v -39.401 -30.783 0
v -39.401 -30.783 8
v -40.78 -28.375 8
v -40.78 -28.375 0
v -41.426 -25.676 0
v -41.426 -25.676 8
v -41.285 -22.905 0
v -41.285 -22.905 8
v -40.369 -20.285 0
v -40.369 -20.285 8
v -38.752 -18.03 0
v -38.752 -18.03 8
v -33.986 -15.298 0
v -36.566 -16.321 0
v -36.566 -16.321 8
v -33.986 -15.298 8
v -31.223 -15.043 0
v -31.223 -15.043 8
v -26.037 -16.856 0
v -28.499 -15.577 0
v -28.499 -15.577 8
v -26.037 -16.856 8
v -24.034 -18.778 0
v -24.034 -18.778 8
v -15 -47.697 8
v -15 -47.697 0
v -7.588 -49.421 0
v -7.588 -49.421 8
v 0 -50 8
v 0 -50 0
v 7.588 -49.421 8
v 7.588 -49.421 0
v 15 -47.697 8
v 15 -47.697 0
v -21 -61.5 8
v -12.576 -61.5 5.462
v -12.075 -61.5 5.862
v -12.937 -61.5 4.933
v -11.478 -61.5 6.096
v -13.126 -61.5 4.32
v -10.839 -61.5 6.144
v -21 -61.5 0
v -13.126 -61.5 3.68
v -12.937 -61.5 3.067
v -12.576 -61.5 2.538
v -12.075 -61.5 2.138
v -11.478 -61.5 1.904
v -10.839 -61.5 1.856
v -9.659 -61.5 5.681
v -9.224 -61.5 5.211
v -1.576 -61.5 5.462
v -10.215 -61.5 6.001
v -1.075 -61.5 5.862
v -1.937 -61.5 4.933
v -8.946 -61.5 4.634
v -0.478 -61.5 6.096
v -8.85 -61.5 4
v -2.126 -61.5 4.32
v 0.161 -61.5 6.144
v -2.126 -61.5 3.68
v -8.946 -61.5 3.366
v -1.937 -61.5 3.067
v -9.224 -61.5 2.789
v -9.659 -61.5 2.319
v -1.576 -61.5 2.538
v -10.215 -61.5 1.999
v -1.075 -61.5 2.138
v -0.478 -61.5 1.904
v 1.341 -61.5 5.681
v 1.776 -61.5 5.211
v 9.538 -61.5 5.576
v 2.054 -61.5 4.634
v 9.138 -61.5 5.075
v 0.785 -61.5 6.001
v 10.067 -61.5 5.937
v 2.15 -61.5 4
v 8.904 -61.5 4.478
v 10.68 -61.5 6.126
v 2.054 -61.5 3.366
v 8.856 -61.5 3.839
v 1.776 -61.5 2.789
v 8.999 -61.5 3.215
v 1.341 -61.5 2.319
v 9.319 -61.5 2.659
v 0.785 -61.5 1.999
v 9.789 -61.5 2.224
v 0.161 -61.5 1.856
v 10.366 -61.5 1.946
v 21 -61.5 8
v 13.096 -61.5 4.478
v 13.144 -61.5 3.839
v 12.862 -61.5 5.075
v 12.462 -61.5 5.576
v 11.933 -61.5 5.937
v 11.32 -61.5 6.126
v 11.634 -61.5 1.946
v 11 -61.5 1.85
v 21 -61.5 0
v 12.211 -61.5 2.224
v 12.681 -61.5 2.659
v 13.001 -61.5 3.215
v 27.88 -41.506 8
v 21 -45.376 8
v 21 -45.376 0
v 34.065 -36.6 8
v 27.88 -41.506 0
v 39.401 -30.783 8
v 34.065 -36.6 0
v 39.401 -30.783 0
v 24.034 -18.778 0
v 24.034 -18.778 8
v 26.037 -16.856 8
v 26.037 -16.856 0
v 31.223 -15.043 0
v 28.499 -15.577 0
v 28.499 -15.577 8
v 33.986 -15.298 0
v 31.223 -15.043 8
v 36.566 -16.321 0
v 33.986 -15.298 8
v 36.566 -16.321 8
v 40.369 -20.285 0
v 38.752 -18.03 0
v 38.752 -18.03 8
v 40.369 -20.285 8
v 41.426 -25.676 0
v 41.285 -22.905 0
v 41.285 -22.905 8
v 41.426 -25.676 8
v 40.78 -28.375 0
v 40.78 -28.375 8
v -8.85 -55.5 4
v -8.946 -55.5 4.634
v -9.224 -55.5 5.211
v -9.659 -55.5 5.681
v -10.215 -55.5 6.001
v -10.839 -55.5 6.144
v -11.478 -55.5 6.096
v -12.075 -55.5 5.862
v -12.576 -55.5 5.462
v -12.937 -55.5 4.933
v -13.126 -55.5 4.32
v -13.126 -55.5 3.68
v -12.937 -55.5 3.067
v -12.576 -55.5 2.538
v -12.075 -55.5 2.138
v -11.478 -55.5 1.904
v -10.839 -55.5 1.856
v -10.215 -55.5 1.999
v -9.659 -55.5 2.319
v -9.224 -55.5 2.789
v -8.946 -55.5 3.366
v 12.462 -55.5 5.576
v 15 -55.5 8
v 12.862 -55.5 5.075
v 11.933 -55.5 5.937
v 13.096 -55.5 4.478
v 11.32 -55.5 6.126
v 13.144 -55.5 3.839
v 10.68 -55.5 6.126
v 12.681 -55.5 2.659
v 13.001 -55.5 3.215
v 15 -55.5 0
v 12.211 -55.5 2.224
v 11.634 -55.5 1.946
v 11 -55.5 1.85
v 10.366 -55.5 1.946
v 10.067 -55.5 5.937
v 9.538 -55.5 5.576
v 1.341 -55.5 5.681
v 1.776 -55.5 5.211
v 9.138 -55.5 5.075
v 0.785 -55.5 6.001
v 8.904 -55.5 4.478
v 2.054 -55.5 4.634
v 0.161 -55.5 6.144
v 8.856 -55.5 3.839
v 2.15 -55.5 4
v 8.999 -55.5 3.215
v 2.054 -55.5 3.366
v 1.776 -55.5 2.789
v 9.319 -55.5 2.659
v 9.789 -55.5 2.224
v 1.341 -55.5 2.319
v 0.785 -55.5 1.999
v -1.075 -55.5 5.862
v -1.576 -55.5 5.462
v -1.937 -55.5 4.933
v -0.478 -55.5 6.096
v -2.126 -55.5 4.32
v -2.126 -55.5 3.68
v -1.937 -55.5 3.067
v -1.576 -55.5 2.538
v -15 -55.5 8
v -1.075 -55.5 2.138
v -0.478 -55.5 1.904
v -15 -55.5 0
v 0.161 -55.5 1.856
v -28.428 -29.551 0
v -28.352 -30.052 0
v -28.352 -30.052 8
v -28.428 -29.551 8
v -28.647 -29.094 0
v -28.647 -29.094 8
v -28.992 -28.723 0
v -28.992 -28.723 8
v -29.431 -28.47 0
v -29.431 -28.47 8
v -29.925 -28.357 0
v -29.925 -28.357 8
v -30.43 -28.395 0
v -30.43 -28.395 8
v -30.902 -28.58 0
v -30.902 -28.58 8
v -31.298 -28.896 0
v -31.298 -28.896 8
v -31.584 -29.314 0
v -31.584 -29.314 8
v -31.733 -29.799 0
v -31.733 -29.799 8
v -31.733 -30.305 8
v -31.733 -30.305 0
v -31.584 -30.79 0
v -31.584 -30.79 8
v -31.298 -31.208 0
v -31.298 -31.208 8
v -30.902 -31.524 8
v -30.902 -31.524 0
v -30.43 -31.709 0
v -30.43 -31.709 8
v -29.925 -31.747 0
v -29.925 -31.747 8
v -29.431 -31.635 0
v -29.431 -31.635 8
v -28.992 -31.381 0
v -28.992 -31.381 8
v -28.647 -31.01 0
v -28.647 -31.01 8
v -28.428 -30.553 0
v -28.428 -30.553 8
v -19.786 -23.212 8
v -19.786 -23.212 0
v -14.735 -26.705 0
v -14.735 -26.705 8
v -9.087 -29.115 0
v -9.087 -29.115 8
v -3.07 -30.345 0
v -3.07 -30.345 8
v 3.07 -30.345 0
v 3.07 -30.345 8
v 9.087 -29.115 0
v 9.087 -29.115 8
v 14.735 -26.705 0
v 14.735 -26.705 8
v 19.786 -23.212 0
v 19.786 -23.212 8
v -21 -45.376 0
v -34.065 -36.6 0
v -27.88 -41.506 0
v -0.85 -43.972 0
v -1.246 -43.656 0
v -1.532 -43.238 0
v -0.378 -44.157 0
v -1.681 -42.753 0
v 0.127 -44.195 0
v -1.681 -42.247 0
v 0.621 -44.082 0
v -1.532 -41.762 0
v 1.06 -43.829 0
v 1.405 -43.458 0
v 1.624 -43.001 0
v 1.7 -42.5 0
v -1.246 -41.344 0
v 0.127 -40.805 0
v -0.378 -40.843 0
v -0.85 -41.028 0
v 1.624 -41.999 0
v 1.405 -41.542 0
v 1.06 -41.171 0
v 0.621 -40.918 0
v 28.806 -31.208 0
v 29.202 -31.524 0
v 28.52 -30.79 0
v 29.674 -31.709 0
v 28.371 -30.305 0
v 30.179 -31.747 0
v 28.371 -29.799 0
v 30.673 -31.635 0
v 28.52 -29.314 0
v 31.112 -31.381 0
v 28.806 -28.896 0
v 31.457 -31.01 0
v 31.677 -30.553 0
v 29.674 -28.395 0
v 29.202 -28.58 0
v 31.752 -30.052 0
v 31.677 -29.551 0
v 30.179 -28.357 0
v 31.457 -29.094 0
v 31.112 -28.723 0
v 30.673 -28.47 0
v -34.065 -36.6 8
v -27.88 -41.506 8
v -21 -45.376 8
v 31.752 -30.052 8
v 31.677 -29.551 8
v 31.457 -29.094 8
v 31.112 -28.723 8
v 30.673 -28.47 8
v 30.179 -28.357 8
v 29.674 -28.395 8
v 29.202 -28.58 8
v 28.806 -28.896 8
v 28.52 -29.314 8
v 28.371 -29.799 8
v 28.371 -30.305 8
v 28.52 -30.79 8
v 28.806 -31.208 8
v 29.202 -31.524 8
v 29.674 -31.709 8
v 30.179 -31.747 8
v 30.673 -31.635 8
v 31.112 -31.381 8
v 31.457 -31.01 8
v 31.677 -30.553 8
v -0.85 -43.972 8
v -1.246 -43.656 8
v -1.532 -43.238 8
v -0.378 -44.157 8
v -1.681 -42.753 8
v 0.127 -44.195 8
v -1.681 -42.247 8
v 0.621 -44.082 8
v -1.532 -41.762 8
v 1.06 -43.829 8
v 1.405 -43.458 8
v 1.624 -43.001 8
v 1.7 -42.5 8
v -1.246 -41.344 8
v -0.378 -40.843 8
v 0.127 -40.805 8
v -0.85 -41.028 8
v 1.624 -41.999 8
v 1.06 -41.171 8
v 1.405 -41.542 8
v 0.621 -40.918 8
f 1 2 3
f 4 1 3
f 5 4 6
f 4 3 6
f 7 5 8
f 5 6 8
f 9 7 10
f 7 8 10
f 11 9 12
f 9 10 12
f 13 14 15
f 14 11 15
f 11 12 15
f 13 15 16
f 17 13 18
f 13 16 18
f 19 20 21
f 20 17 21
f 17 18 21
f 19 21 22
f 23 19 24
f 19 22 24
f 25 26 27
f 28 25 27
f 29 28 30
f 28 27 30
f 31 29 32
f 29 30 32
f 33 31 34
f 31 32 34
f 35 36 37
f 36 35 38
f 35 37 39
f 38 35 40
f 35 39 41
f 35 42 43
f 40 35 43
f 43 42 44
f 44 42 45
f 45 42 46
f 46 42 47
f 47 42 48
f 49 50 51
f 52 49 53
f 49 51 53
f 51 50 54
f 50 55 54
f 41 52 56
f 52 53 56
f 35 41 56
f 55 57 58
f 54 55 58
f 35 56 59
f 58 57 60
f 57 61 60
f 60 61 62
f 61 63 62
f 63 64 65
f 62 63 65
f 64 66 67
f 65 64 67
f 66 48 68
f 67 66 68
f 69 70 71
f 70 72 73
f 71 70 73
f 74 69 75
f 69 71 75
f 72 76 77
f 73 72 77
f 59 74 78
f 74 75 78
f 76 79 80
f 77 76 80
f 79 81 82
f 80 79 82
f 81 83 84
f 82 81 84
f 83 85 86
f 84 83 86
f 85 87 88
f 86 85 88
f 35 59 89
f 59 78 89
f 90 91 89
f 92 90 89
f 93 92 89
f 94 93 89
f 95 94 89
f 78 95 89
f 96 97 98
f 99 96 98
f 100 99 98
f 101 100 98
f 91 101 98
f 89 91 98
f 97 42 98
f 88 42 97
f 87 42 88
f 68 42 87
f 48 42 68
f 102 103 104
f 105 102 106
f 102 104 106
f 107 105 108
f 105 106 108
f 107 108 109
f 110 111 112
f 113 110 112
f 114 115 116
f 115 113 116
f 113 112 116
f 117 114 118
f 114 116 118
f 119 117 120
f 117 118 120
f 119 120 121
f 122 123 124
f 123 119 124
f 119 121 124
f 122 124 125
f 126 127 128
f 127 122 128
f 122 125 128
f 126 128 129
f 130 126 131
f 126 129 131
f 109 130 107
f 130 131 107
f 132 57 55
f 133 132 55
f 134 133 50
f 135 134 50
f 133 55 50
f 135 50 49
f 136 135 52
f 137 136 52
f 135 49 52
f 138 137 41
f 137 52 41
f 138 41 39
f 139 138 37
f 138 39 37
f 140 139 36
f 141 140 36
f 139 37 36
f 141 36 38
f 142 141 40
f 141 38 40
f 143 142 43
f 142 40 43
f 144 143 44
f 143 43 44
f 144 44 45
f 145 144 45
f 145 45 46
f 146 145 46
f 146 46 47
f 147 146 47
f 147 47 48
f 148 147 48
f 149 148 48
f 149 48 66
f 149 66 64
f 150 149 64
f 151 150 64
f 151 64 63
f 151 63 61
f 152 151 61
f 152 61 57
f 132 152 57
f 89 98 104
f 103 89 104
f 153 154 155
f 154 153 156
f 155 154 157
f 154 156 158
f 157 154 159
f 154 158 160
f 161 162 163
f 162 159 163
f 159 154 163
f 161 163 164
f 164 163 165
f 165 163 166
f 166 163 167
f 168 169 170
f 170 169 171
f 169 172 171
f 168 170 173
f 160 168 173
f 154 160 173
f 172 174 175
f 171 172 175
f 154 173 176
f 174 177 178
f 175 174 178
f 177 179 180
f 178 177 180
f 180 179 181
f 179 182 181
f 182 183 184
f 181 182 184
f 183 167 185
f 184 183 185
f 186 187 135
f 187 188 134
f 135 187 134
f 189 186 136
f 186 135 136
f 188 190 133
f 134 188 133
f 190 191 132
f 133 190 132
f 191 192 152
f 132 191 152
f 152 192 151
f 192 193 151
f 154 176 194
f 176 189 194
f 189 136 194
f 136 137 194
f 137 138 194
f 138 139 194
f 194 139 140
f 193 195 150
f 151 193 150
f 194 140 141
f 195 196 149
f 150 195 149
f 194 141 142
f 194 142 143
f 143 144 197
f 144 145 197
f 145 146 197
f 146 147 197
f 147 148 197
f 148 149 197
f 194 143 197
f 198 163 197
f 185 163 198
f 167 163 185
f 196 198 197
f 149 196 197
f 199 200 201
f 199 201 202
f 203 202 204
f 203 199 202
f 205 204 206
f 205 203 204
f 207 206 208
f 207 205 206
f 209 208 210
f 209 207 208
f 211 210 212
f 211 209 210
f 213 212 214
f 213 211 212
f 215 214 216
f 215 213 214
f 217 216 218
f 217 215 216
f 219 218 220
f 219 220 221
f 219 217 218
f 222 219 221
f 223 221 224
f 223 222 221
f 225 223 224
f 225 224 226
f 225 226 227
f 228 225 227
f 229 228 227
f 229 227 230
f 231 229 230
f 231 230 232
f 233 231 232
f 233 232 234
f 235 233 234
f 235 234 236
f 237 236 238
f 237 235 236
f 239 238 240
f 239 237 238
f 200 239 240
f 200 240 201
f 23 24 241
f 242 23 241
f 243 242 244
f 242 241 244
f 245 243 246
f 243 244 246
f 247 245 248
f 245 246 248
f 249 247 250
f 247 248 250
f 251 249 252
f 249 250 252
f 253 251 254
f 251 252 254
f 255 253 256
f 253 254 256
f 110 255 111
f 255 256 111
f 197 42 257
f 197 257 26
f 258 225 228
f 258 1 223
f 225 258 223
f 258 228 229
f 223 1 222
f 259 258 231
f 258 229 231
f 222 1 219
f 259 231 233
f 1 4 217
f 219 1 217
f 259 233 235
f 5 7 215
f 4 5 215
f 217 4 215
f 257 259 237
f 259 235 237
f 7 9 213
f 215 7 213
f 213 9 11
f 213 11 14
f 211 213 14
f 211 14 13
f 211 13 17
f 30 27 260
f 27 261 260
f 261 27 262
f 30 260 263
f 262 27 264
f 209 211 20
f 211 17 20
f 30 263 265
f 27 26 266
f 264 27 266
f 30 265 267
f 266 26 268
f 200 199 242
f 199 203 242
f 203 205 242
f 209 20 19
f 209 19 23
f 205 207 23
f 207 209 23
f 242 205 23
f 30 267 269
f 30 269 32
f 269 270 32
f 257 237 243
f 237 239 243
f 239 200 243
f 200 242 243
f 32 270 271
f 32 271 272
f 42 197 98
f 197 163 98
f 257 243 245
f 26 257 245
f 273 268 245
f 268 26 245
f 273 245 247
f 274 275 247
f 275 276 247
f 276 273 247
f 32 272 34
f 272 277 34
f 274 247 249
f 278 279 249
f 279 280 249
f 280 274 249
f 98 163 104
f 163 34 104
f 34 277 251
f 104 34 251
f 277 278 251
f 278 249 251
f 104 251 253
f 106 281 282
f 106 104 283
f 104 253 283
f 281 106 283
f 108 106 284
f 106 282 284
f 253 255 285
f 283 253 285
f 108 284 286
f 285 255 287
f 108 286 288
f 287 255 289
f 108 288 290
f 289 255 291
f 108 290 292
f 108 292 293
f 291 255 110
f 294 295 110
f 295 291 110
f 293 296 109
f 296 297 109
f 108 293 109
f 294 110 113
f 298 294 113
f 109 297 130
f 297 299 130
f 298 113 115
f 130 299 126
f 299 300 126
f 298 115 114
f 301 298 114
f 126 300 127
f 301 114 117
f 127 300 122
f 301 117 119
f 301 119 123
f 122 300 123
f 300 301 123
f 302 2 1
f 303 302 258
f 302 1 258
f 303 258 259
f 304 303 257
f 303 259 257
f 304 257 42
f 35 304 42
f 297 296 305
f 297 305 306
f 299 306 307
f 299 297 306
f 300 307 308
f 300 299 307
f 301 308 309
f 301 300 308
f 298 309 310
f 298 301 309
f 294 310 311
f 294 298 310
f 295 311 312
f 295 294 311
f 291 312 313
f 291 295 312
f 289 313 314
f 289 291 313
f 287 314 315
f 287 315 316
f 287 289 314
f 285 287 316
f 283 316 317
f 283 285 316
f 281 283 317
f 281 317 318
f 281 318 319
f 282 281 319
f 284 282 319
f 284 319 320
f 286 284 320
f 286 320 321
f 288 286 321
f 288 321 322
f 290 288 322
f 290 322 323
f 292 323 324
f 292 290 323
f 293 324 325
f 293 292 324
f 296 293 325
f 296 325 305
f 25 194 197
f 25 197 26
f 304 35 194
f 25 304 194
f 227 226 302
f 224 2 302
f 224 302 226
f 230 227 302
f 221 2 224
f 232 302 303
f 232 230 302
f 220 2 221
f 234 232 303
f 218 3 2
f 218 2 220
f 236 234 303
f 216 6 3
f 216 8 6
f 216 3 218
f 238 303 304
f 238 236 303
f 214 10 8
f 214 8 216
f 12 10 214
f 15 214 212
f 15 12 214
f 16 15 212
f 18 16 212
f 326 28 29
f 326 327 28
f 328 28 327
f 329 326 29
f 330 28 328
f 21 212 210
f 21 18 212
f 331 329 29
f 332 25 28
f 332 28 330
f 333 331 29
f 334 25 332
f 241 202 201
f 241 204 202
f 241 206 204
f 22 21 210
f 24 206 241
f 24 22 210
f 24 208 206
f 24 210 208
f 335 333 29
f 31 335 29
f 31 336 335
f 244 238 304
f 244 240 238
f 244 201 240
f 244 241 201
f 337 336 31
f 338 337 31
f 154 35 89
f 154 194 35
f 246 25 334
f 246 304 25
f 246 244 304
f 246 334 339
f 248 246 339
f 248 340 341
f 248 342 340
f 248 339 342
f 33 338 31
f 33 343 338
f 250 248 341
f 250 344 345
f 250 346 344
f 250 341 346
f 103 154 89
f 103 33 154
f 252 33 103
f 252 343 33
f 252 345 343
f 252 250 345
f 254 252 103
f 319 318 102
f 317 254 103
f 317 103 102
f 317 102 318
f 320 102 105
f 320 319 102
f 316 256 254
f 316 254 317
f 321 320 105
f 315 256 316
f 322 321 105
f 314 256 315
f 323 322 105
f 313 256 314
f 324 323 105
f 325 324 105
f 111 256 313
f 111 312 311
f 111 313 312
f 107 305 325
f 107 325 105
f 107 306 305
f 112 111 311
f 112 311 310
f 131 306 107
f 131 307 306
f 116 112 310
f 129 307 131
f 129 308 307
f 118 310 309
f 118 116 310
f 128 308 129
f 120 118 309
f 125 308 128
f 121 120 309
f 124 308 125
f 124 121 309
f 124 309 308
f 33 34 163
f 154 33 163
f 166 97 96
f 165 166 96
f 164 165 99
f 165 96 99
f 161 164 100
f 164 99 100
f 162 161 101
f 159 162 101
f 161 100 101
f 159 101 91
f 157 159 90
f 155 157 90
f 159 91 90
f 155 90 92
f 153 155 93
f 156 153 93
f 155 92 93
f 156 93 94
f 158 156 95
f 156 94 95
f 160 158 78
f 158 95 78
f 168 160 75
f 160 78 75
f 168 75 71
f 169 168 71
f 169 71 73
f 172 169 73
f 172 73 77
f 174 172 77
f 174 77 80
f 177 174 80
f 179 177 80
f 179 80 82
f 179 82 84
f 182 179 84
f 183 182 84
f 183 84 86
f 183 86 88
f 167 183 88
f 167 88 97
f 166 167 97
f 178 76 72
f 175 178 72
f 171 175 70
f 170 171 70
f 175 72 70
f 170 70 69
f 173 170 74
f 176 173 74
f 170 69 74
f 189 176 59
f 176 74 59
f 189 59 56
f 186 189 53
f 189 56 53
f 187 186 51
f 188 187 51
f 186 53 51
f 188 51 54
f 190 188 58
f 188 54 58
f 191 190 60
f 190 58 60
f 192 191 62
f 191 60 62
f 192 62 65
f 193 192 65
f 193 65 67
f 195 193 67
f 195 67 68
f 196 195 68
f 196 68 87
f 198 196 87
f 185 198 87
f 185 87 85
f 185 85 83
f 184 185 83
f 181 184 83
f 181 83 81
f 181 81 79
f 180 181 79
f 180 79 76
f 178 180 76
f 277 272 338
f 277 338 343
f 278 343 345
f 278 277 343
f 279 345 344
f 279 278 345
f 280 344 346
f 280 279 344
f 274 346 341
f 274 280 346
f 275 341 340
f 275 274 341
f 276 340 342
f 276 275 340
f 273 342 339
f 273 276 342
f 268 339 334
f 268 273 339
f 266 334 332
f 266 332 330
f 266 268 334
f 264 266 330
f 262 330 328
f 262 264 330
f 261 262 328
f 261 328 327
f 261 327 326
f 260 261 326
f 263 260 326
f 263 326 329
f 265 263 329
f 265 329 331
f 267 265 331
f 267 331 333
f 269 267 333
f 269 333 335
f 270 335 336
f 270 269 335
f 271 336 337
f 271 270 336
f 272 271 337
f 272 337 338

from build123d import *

# Parameters (mm, degrees)
SKETCH_1_R          = 50
SKETCH_1_R_2        = 1.7
EXTRUDE_1_DEPTH     = 8
SKETCH_2_R          = 30.5
CUT_EXTRUDE_1_DEPTH = 8
CUT_EXTRUDE_6_DEPTH = 84
EXTRUDE_START       = -8
EXTRUDE_5_DEPTH     = 8
SKETCH_10_R         = 2.15
CUT_EXTRUDE_7_DEPTH = 8


with BuildPart() as part:
    # 草图1 → 凸台-拉伸1 (new body)
    with BuildSketch(Plane.XY):
        Circle(SKETCH_1_R)
        with Locations((0, 42.5)):
            Circle(SKETCH_1_R_2, mode=Mode.SUBTRACT)
        with Locations((30.0520382, 30.0520382)):
            Circle(SKETCH_1_R_2, mode=Mode.SUBTRACT)
        with Locations((42.5, 0)):
            Circle(SKETCH_1_R_2, mode=Mode.SUBTRACT)
        with Locations((30.0520382, -30.0520382)):
            Circle(SKETCH_1_R_2, mode=Mode.SUBTRACT)
        with Locations((0, -42.5)):
            Circle(SKETCH_1_R_2, mode=Mode.SUBTRACT)
        with Locations((-30.0520382, -30.0520382)):
            Circle(SKETCH_1_R_2, mode=Mode.SUBTRACT)
        with Locations((-42.5, 0)):
            Circle(SKETCH_1_R_2, mode=Mode.SUBTRACT)
        with Locations((-30.0520382, 30.0520382)):
            Circle(SKETCH_1_R_2, mode=Mode.SUBTRACT)
    extrude(amount=EXTRUDE_1_DEPTH)

    # 草图2 → 切除-拉伸1 (cut)
    with BuildSketch(Plane.XY.offset(8)):
        Circle(SKETCH_2_R)
    extrude(amount=-CUT_EXTRUDE_1_DEPTH, mode=Mode.SUBTRACT)

    # 草图3 → 切除-拉伸6 (cut)
    with BuildSketch(Plane.XY.offset(8)):
        with BuildLine():
            ThreePointArc((-39.400537164, -30.783074428), (-37.720132642, -17.097269866), (-24.034328132, -18.77767481))
            ThreePointArc((-24.034328132, -18.77767481), (9.7e-08, 30.5), (24.034328012, -18.777674963))
            ThreePointArc((24.034328012, -18.777674963), (37.720132595, -17.097269829), (39.400537117, -30.783074488))
            ThreePointArc((39.400537117, -30.783074488), (3.8e-08, 50), (-39.400537164, -30.783074428))
        make_face()
    extrude(amount=-CUT_EXTRUDE_6_DEPTH, mode=Mode.SUBTRACT)

    # 草图8 → 凸台-拉伸5 (add)
    with BuildSketch(Plane.XY.offset(8).offset(EXTRUDE_START)):
        with BuildLine():
            ThreePointArc((-15, -47.696960071), (-18.037363326, -46.633180507), (-21, -45.376205218))
            Line((-21, -45.376205218), (-21, -61.5))
            Line((-21, -61.5), (21, -61.5))
            Line((21, -61.5), (21, -45.376205218))
            ThreePointArc((21, -45.376205218), (18.037363326, -46.633180507), (15, -47.696960071))
            Line((15, -47.696960071), (15, -55.5))
            Line((15, -55.5), (-15, -55.5))
            Line((-15, -55.5), (-15, -47.696960071))
        make_face()
    extrude(amount=EXTRUDE_5_DEPTH)

    # 草图10 → 切除-拉伸7 (cut)
    with BuildSketch(Plane.XZ.offset(61.5)):
        with Locations((-11, 4)):
            Circle(SKETCH_10_R)
        with Locations((0, 4)):
            Circle(SKETCH_10_R)
        with Locations(Location((11, 4, 0), (0, 0, 270))):
            Circle(SKETCH_10_R)
    extrude(amount=-CUT_EXTRUDE_7_DEPTH, mode=Mode.SUBTRACT)


solid = part.part
